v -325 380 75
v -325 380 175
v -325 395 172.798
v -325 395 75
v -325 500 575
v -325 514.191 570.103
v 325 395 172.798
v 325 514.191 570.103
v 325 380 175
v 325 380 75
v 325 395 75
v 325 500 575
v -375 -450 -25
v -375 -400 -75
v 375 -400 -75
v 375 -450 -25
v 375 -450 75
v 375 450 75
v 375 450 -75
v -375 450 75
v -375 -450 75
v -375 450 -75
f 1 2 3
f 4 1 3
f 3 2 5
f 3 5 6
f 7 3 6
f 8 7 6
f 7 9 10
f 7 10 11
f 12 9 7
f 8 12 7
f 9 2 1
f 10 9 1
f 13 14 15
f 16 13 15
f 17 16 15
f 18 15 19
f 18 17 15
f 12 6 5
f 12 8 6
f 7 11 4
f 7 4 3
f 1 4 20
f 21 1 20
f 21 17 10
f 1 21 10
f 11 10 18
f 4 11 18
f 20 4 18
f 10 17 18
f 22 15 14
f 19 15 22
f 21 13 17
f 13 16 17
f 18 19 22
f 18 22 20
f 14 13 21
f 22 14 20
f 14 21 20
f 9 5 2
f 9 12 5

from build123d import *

# Parameters (mm, degrees)
F0_W     = 900
F0_H     = 150
F1_DEPTH = 375
F2_SIZE  = 50
F4_DEPTH = 325


with BuildPart() as f1:
    # F0 (on Right) → F1 (new body, symmetric)
    with BuildSketch(Plane.YZ):
        Rectangle(F0_W, F0_H)
    extrude(amount=F1_DEPTH, both=True)

    # F2
    f2_edges = [f1.edges().sort_by_distance(p)[0] for p in [
        (0, -450, -75),
    ]]
    chamfer(f2_edges, length=F2_SIZE)

    # F3 (on Right) → F4 (join, symmetric)
    with BuildSketch(Plane.YZ):
        Polygon((380, 175), (380, 75), (395, 75), (395, 172.798467), (514.191467, 570.103357), (500, 575), align=None)
    extrude(amount=F4_DEPTH, both=True)


solid = f1.part
